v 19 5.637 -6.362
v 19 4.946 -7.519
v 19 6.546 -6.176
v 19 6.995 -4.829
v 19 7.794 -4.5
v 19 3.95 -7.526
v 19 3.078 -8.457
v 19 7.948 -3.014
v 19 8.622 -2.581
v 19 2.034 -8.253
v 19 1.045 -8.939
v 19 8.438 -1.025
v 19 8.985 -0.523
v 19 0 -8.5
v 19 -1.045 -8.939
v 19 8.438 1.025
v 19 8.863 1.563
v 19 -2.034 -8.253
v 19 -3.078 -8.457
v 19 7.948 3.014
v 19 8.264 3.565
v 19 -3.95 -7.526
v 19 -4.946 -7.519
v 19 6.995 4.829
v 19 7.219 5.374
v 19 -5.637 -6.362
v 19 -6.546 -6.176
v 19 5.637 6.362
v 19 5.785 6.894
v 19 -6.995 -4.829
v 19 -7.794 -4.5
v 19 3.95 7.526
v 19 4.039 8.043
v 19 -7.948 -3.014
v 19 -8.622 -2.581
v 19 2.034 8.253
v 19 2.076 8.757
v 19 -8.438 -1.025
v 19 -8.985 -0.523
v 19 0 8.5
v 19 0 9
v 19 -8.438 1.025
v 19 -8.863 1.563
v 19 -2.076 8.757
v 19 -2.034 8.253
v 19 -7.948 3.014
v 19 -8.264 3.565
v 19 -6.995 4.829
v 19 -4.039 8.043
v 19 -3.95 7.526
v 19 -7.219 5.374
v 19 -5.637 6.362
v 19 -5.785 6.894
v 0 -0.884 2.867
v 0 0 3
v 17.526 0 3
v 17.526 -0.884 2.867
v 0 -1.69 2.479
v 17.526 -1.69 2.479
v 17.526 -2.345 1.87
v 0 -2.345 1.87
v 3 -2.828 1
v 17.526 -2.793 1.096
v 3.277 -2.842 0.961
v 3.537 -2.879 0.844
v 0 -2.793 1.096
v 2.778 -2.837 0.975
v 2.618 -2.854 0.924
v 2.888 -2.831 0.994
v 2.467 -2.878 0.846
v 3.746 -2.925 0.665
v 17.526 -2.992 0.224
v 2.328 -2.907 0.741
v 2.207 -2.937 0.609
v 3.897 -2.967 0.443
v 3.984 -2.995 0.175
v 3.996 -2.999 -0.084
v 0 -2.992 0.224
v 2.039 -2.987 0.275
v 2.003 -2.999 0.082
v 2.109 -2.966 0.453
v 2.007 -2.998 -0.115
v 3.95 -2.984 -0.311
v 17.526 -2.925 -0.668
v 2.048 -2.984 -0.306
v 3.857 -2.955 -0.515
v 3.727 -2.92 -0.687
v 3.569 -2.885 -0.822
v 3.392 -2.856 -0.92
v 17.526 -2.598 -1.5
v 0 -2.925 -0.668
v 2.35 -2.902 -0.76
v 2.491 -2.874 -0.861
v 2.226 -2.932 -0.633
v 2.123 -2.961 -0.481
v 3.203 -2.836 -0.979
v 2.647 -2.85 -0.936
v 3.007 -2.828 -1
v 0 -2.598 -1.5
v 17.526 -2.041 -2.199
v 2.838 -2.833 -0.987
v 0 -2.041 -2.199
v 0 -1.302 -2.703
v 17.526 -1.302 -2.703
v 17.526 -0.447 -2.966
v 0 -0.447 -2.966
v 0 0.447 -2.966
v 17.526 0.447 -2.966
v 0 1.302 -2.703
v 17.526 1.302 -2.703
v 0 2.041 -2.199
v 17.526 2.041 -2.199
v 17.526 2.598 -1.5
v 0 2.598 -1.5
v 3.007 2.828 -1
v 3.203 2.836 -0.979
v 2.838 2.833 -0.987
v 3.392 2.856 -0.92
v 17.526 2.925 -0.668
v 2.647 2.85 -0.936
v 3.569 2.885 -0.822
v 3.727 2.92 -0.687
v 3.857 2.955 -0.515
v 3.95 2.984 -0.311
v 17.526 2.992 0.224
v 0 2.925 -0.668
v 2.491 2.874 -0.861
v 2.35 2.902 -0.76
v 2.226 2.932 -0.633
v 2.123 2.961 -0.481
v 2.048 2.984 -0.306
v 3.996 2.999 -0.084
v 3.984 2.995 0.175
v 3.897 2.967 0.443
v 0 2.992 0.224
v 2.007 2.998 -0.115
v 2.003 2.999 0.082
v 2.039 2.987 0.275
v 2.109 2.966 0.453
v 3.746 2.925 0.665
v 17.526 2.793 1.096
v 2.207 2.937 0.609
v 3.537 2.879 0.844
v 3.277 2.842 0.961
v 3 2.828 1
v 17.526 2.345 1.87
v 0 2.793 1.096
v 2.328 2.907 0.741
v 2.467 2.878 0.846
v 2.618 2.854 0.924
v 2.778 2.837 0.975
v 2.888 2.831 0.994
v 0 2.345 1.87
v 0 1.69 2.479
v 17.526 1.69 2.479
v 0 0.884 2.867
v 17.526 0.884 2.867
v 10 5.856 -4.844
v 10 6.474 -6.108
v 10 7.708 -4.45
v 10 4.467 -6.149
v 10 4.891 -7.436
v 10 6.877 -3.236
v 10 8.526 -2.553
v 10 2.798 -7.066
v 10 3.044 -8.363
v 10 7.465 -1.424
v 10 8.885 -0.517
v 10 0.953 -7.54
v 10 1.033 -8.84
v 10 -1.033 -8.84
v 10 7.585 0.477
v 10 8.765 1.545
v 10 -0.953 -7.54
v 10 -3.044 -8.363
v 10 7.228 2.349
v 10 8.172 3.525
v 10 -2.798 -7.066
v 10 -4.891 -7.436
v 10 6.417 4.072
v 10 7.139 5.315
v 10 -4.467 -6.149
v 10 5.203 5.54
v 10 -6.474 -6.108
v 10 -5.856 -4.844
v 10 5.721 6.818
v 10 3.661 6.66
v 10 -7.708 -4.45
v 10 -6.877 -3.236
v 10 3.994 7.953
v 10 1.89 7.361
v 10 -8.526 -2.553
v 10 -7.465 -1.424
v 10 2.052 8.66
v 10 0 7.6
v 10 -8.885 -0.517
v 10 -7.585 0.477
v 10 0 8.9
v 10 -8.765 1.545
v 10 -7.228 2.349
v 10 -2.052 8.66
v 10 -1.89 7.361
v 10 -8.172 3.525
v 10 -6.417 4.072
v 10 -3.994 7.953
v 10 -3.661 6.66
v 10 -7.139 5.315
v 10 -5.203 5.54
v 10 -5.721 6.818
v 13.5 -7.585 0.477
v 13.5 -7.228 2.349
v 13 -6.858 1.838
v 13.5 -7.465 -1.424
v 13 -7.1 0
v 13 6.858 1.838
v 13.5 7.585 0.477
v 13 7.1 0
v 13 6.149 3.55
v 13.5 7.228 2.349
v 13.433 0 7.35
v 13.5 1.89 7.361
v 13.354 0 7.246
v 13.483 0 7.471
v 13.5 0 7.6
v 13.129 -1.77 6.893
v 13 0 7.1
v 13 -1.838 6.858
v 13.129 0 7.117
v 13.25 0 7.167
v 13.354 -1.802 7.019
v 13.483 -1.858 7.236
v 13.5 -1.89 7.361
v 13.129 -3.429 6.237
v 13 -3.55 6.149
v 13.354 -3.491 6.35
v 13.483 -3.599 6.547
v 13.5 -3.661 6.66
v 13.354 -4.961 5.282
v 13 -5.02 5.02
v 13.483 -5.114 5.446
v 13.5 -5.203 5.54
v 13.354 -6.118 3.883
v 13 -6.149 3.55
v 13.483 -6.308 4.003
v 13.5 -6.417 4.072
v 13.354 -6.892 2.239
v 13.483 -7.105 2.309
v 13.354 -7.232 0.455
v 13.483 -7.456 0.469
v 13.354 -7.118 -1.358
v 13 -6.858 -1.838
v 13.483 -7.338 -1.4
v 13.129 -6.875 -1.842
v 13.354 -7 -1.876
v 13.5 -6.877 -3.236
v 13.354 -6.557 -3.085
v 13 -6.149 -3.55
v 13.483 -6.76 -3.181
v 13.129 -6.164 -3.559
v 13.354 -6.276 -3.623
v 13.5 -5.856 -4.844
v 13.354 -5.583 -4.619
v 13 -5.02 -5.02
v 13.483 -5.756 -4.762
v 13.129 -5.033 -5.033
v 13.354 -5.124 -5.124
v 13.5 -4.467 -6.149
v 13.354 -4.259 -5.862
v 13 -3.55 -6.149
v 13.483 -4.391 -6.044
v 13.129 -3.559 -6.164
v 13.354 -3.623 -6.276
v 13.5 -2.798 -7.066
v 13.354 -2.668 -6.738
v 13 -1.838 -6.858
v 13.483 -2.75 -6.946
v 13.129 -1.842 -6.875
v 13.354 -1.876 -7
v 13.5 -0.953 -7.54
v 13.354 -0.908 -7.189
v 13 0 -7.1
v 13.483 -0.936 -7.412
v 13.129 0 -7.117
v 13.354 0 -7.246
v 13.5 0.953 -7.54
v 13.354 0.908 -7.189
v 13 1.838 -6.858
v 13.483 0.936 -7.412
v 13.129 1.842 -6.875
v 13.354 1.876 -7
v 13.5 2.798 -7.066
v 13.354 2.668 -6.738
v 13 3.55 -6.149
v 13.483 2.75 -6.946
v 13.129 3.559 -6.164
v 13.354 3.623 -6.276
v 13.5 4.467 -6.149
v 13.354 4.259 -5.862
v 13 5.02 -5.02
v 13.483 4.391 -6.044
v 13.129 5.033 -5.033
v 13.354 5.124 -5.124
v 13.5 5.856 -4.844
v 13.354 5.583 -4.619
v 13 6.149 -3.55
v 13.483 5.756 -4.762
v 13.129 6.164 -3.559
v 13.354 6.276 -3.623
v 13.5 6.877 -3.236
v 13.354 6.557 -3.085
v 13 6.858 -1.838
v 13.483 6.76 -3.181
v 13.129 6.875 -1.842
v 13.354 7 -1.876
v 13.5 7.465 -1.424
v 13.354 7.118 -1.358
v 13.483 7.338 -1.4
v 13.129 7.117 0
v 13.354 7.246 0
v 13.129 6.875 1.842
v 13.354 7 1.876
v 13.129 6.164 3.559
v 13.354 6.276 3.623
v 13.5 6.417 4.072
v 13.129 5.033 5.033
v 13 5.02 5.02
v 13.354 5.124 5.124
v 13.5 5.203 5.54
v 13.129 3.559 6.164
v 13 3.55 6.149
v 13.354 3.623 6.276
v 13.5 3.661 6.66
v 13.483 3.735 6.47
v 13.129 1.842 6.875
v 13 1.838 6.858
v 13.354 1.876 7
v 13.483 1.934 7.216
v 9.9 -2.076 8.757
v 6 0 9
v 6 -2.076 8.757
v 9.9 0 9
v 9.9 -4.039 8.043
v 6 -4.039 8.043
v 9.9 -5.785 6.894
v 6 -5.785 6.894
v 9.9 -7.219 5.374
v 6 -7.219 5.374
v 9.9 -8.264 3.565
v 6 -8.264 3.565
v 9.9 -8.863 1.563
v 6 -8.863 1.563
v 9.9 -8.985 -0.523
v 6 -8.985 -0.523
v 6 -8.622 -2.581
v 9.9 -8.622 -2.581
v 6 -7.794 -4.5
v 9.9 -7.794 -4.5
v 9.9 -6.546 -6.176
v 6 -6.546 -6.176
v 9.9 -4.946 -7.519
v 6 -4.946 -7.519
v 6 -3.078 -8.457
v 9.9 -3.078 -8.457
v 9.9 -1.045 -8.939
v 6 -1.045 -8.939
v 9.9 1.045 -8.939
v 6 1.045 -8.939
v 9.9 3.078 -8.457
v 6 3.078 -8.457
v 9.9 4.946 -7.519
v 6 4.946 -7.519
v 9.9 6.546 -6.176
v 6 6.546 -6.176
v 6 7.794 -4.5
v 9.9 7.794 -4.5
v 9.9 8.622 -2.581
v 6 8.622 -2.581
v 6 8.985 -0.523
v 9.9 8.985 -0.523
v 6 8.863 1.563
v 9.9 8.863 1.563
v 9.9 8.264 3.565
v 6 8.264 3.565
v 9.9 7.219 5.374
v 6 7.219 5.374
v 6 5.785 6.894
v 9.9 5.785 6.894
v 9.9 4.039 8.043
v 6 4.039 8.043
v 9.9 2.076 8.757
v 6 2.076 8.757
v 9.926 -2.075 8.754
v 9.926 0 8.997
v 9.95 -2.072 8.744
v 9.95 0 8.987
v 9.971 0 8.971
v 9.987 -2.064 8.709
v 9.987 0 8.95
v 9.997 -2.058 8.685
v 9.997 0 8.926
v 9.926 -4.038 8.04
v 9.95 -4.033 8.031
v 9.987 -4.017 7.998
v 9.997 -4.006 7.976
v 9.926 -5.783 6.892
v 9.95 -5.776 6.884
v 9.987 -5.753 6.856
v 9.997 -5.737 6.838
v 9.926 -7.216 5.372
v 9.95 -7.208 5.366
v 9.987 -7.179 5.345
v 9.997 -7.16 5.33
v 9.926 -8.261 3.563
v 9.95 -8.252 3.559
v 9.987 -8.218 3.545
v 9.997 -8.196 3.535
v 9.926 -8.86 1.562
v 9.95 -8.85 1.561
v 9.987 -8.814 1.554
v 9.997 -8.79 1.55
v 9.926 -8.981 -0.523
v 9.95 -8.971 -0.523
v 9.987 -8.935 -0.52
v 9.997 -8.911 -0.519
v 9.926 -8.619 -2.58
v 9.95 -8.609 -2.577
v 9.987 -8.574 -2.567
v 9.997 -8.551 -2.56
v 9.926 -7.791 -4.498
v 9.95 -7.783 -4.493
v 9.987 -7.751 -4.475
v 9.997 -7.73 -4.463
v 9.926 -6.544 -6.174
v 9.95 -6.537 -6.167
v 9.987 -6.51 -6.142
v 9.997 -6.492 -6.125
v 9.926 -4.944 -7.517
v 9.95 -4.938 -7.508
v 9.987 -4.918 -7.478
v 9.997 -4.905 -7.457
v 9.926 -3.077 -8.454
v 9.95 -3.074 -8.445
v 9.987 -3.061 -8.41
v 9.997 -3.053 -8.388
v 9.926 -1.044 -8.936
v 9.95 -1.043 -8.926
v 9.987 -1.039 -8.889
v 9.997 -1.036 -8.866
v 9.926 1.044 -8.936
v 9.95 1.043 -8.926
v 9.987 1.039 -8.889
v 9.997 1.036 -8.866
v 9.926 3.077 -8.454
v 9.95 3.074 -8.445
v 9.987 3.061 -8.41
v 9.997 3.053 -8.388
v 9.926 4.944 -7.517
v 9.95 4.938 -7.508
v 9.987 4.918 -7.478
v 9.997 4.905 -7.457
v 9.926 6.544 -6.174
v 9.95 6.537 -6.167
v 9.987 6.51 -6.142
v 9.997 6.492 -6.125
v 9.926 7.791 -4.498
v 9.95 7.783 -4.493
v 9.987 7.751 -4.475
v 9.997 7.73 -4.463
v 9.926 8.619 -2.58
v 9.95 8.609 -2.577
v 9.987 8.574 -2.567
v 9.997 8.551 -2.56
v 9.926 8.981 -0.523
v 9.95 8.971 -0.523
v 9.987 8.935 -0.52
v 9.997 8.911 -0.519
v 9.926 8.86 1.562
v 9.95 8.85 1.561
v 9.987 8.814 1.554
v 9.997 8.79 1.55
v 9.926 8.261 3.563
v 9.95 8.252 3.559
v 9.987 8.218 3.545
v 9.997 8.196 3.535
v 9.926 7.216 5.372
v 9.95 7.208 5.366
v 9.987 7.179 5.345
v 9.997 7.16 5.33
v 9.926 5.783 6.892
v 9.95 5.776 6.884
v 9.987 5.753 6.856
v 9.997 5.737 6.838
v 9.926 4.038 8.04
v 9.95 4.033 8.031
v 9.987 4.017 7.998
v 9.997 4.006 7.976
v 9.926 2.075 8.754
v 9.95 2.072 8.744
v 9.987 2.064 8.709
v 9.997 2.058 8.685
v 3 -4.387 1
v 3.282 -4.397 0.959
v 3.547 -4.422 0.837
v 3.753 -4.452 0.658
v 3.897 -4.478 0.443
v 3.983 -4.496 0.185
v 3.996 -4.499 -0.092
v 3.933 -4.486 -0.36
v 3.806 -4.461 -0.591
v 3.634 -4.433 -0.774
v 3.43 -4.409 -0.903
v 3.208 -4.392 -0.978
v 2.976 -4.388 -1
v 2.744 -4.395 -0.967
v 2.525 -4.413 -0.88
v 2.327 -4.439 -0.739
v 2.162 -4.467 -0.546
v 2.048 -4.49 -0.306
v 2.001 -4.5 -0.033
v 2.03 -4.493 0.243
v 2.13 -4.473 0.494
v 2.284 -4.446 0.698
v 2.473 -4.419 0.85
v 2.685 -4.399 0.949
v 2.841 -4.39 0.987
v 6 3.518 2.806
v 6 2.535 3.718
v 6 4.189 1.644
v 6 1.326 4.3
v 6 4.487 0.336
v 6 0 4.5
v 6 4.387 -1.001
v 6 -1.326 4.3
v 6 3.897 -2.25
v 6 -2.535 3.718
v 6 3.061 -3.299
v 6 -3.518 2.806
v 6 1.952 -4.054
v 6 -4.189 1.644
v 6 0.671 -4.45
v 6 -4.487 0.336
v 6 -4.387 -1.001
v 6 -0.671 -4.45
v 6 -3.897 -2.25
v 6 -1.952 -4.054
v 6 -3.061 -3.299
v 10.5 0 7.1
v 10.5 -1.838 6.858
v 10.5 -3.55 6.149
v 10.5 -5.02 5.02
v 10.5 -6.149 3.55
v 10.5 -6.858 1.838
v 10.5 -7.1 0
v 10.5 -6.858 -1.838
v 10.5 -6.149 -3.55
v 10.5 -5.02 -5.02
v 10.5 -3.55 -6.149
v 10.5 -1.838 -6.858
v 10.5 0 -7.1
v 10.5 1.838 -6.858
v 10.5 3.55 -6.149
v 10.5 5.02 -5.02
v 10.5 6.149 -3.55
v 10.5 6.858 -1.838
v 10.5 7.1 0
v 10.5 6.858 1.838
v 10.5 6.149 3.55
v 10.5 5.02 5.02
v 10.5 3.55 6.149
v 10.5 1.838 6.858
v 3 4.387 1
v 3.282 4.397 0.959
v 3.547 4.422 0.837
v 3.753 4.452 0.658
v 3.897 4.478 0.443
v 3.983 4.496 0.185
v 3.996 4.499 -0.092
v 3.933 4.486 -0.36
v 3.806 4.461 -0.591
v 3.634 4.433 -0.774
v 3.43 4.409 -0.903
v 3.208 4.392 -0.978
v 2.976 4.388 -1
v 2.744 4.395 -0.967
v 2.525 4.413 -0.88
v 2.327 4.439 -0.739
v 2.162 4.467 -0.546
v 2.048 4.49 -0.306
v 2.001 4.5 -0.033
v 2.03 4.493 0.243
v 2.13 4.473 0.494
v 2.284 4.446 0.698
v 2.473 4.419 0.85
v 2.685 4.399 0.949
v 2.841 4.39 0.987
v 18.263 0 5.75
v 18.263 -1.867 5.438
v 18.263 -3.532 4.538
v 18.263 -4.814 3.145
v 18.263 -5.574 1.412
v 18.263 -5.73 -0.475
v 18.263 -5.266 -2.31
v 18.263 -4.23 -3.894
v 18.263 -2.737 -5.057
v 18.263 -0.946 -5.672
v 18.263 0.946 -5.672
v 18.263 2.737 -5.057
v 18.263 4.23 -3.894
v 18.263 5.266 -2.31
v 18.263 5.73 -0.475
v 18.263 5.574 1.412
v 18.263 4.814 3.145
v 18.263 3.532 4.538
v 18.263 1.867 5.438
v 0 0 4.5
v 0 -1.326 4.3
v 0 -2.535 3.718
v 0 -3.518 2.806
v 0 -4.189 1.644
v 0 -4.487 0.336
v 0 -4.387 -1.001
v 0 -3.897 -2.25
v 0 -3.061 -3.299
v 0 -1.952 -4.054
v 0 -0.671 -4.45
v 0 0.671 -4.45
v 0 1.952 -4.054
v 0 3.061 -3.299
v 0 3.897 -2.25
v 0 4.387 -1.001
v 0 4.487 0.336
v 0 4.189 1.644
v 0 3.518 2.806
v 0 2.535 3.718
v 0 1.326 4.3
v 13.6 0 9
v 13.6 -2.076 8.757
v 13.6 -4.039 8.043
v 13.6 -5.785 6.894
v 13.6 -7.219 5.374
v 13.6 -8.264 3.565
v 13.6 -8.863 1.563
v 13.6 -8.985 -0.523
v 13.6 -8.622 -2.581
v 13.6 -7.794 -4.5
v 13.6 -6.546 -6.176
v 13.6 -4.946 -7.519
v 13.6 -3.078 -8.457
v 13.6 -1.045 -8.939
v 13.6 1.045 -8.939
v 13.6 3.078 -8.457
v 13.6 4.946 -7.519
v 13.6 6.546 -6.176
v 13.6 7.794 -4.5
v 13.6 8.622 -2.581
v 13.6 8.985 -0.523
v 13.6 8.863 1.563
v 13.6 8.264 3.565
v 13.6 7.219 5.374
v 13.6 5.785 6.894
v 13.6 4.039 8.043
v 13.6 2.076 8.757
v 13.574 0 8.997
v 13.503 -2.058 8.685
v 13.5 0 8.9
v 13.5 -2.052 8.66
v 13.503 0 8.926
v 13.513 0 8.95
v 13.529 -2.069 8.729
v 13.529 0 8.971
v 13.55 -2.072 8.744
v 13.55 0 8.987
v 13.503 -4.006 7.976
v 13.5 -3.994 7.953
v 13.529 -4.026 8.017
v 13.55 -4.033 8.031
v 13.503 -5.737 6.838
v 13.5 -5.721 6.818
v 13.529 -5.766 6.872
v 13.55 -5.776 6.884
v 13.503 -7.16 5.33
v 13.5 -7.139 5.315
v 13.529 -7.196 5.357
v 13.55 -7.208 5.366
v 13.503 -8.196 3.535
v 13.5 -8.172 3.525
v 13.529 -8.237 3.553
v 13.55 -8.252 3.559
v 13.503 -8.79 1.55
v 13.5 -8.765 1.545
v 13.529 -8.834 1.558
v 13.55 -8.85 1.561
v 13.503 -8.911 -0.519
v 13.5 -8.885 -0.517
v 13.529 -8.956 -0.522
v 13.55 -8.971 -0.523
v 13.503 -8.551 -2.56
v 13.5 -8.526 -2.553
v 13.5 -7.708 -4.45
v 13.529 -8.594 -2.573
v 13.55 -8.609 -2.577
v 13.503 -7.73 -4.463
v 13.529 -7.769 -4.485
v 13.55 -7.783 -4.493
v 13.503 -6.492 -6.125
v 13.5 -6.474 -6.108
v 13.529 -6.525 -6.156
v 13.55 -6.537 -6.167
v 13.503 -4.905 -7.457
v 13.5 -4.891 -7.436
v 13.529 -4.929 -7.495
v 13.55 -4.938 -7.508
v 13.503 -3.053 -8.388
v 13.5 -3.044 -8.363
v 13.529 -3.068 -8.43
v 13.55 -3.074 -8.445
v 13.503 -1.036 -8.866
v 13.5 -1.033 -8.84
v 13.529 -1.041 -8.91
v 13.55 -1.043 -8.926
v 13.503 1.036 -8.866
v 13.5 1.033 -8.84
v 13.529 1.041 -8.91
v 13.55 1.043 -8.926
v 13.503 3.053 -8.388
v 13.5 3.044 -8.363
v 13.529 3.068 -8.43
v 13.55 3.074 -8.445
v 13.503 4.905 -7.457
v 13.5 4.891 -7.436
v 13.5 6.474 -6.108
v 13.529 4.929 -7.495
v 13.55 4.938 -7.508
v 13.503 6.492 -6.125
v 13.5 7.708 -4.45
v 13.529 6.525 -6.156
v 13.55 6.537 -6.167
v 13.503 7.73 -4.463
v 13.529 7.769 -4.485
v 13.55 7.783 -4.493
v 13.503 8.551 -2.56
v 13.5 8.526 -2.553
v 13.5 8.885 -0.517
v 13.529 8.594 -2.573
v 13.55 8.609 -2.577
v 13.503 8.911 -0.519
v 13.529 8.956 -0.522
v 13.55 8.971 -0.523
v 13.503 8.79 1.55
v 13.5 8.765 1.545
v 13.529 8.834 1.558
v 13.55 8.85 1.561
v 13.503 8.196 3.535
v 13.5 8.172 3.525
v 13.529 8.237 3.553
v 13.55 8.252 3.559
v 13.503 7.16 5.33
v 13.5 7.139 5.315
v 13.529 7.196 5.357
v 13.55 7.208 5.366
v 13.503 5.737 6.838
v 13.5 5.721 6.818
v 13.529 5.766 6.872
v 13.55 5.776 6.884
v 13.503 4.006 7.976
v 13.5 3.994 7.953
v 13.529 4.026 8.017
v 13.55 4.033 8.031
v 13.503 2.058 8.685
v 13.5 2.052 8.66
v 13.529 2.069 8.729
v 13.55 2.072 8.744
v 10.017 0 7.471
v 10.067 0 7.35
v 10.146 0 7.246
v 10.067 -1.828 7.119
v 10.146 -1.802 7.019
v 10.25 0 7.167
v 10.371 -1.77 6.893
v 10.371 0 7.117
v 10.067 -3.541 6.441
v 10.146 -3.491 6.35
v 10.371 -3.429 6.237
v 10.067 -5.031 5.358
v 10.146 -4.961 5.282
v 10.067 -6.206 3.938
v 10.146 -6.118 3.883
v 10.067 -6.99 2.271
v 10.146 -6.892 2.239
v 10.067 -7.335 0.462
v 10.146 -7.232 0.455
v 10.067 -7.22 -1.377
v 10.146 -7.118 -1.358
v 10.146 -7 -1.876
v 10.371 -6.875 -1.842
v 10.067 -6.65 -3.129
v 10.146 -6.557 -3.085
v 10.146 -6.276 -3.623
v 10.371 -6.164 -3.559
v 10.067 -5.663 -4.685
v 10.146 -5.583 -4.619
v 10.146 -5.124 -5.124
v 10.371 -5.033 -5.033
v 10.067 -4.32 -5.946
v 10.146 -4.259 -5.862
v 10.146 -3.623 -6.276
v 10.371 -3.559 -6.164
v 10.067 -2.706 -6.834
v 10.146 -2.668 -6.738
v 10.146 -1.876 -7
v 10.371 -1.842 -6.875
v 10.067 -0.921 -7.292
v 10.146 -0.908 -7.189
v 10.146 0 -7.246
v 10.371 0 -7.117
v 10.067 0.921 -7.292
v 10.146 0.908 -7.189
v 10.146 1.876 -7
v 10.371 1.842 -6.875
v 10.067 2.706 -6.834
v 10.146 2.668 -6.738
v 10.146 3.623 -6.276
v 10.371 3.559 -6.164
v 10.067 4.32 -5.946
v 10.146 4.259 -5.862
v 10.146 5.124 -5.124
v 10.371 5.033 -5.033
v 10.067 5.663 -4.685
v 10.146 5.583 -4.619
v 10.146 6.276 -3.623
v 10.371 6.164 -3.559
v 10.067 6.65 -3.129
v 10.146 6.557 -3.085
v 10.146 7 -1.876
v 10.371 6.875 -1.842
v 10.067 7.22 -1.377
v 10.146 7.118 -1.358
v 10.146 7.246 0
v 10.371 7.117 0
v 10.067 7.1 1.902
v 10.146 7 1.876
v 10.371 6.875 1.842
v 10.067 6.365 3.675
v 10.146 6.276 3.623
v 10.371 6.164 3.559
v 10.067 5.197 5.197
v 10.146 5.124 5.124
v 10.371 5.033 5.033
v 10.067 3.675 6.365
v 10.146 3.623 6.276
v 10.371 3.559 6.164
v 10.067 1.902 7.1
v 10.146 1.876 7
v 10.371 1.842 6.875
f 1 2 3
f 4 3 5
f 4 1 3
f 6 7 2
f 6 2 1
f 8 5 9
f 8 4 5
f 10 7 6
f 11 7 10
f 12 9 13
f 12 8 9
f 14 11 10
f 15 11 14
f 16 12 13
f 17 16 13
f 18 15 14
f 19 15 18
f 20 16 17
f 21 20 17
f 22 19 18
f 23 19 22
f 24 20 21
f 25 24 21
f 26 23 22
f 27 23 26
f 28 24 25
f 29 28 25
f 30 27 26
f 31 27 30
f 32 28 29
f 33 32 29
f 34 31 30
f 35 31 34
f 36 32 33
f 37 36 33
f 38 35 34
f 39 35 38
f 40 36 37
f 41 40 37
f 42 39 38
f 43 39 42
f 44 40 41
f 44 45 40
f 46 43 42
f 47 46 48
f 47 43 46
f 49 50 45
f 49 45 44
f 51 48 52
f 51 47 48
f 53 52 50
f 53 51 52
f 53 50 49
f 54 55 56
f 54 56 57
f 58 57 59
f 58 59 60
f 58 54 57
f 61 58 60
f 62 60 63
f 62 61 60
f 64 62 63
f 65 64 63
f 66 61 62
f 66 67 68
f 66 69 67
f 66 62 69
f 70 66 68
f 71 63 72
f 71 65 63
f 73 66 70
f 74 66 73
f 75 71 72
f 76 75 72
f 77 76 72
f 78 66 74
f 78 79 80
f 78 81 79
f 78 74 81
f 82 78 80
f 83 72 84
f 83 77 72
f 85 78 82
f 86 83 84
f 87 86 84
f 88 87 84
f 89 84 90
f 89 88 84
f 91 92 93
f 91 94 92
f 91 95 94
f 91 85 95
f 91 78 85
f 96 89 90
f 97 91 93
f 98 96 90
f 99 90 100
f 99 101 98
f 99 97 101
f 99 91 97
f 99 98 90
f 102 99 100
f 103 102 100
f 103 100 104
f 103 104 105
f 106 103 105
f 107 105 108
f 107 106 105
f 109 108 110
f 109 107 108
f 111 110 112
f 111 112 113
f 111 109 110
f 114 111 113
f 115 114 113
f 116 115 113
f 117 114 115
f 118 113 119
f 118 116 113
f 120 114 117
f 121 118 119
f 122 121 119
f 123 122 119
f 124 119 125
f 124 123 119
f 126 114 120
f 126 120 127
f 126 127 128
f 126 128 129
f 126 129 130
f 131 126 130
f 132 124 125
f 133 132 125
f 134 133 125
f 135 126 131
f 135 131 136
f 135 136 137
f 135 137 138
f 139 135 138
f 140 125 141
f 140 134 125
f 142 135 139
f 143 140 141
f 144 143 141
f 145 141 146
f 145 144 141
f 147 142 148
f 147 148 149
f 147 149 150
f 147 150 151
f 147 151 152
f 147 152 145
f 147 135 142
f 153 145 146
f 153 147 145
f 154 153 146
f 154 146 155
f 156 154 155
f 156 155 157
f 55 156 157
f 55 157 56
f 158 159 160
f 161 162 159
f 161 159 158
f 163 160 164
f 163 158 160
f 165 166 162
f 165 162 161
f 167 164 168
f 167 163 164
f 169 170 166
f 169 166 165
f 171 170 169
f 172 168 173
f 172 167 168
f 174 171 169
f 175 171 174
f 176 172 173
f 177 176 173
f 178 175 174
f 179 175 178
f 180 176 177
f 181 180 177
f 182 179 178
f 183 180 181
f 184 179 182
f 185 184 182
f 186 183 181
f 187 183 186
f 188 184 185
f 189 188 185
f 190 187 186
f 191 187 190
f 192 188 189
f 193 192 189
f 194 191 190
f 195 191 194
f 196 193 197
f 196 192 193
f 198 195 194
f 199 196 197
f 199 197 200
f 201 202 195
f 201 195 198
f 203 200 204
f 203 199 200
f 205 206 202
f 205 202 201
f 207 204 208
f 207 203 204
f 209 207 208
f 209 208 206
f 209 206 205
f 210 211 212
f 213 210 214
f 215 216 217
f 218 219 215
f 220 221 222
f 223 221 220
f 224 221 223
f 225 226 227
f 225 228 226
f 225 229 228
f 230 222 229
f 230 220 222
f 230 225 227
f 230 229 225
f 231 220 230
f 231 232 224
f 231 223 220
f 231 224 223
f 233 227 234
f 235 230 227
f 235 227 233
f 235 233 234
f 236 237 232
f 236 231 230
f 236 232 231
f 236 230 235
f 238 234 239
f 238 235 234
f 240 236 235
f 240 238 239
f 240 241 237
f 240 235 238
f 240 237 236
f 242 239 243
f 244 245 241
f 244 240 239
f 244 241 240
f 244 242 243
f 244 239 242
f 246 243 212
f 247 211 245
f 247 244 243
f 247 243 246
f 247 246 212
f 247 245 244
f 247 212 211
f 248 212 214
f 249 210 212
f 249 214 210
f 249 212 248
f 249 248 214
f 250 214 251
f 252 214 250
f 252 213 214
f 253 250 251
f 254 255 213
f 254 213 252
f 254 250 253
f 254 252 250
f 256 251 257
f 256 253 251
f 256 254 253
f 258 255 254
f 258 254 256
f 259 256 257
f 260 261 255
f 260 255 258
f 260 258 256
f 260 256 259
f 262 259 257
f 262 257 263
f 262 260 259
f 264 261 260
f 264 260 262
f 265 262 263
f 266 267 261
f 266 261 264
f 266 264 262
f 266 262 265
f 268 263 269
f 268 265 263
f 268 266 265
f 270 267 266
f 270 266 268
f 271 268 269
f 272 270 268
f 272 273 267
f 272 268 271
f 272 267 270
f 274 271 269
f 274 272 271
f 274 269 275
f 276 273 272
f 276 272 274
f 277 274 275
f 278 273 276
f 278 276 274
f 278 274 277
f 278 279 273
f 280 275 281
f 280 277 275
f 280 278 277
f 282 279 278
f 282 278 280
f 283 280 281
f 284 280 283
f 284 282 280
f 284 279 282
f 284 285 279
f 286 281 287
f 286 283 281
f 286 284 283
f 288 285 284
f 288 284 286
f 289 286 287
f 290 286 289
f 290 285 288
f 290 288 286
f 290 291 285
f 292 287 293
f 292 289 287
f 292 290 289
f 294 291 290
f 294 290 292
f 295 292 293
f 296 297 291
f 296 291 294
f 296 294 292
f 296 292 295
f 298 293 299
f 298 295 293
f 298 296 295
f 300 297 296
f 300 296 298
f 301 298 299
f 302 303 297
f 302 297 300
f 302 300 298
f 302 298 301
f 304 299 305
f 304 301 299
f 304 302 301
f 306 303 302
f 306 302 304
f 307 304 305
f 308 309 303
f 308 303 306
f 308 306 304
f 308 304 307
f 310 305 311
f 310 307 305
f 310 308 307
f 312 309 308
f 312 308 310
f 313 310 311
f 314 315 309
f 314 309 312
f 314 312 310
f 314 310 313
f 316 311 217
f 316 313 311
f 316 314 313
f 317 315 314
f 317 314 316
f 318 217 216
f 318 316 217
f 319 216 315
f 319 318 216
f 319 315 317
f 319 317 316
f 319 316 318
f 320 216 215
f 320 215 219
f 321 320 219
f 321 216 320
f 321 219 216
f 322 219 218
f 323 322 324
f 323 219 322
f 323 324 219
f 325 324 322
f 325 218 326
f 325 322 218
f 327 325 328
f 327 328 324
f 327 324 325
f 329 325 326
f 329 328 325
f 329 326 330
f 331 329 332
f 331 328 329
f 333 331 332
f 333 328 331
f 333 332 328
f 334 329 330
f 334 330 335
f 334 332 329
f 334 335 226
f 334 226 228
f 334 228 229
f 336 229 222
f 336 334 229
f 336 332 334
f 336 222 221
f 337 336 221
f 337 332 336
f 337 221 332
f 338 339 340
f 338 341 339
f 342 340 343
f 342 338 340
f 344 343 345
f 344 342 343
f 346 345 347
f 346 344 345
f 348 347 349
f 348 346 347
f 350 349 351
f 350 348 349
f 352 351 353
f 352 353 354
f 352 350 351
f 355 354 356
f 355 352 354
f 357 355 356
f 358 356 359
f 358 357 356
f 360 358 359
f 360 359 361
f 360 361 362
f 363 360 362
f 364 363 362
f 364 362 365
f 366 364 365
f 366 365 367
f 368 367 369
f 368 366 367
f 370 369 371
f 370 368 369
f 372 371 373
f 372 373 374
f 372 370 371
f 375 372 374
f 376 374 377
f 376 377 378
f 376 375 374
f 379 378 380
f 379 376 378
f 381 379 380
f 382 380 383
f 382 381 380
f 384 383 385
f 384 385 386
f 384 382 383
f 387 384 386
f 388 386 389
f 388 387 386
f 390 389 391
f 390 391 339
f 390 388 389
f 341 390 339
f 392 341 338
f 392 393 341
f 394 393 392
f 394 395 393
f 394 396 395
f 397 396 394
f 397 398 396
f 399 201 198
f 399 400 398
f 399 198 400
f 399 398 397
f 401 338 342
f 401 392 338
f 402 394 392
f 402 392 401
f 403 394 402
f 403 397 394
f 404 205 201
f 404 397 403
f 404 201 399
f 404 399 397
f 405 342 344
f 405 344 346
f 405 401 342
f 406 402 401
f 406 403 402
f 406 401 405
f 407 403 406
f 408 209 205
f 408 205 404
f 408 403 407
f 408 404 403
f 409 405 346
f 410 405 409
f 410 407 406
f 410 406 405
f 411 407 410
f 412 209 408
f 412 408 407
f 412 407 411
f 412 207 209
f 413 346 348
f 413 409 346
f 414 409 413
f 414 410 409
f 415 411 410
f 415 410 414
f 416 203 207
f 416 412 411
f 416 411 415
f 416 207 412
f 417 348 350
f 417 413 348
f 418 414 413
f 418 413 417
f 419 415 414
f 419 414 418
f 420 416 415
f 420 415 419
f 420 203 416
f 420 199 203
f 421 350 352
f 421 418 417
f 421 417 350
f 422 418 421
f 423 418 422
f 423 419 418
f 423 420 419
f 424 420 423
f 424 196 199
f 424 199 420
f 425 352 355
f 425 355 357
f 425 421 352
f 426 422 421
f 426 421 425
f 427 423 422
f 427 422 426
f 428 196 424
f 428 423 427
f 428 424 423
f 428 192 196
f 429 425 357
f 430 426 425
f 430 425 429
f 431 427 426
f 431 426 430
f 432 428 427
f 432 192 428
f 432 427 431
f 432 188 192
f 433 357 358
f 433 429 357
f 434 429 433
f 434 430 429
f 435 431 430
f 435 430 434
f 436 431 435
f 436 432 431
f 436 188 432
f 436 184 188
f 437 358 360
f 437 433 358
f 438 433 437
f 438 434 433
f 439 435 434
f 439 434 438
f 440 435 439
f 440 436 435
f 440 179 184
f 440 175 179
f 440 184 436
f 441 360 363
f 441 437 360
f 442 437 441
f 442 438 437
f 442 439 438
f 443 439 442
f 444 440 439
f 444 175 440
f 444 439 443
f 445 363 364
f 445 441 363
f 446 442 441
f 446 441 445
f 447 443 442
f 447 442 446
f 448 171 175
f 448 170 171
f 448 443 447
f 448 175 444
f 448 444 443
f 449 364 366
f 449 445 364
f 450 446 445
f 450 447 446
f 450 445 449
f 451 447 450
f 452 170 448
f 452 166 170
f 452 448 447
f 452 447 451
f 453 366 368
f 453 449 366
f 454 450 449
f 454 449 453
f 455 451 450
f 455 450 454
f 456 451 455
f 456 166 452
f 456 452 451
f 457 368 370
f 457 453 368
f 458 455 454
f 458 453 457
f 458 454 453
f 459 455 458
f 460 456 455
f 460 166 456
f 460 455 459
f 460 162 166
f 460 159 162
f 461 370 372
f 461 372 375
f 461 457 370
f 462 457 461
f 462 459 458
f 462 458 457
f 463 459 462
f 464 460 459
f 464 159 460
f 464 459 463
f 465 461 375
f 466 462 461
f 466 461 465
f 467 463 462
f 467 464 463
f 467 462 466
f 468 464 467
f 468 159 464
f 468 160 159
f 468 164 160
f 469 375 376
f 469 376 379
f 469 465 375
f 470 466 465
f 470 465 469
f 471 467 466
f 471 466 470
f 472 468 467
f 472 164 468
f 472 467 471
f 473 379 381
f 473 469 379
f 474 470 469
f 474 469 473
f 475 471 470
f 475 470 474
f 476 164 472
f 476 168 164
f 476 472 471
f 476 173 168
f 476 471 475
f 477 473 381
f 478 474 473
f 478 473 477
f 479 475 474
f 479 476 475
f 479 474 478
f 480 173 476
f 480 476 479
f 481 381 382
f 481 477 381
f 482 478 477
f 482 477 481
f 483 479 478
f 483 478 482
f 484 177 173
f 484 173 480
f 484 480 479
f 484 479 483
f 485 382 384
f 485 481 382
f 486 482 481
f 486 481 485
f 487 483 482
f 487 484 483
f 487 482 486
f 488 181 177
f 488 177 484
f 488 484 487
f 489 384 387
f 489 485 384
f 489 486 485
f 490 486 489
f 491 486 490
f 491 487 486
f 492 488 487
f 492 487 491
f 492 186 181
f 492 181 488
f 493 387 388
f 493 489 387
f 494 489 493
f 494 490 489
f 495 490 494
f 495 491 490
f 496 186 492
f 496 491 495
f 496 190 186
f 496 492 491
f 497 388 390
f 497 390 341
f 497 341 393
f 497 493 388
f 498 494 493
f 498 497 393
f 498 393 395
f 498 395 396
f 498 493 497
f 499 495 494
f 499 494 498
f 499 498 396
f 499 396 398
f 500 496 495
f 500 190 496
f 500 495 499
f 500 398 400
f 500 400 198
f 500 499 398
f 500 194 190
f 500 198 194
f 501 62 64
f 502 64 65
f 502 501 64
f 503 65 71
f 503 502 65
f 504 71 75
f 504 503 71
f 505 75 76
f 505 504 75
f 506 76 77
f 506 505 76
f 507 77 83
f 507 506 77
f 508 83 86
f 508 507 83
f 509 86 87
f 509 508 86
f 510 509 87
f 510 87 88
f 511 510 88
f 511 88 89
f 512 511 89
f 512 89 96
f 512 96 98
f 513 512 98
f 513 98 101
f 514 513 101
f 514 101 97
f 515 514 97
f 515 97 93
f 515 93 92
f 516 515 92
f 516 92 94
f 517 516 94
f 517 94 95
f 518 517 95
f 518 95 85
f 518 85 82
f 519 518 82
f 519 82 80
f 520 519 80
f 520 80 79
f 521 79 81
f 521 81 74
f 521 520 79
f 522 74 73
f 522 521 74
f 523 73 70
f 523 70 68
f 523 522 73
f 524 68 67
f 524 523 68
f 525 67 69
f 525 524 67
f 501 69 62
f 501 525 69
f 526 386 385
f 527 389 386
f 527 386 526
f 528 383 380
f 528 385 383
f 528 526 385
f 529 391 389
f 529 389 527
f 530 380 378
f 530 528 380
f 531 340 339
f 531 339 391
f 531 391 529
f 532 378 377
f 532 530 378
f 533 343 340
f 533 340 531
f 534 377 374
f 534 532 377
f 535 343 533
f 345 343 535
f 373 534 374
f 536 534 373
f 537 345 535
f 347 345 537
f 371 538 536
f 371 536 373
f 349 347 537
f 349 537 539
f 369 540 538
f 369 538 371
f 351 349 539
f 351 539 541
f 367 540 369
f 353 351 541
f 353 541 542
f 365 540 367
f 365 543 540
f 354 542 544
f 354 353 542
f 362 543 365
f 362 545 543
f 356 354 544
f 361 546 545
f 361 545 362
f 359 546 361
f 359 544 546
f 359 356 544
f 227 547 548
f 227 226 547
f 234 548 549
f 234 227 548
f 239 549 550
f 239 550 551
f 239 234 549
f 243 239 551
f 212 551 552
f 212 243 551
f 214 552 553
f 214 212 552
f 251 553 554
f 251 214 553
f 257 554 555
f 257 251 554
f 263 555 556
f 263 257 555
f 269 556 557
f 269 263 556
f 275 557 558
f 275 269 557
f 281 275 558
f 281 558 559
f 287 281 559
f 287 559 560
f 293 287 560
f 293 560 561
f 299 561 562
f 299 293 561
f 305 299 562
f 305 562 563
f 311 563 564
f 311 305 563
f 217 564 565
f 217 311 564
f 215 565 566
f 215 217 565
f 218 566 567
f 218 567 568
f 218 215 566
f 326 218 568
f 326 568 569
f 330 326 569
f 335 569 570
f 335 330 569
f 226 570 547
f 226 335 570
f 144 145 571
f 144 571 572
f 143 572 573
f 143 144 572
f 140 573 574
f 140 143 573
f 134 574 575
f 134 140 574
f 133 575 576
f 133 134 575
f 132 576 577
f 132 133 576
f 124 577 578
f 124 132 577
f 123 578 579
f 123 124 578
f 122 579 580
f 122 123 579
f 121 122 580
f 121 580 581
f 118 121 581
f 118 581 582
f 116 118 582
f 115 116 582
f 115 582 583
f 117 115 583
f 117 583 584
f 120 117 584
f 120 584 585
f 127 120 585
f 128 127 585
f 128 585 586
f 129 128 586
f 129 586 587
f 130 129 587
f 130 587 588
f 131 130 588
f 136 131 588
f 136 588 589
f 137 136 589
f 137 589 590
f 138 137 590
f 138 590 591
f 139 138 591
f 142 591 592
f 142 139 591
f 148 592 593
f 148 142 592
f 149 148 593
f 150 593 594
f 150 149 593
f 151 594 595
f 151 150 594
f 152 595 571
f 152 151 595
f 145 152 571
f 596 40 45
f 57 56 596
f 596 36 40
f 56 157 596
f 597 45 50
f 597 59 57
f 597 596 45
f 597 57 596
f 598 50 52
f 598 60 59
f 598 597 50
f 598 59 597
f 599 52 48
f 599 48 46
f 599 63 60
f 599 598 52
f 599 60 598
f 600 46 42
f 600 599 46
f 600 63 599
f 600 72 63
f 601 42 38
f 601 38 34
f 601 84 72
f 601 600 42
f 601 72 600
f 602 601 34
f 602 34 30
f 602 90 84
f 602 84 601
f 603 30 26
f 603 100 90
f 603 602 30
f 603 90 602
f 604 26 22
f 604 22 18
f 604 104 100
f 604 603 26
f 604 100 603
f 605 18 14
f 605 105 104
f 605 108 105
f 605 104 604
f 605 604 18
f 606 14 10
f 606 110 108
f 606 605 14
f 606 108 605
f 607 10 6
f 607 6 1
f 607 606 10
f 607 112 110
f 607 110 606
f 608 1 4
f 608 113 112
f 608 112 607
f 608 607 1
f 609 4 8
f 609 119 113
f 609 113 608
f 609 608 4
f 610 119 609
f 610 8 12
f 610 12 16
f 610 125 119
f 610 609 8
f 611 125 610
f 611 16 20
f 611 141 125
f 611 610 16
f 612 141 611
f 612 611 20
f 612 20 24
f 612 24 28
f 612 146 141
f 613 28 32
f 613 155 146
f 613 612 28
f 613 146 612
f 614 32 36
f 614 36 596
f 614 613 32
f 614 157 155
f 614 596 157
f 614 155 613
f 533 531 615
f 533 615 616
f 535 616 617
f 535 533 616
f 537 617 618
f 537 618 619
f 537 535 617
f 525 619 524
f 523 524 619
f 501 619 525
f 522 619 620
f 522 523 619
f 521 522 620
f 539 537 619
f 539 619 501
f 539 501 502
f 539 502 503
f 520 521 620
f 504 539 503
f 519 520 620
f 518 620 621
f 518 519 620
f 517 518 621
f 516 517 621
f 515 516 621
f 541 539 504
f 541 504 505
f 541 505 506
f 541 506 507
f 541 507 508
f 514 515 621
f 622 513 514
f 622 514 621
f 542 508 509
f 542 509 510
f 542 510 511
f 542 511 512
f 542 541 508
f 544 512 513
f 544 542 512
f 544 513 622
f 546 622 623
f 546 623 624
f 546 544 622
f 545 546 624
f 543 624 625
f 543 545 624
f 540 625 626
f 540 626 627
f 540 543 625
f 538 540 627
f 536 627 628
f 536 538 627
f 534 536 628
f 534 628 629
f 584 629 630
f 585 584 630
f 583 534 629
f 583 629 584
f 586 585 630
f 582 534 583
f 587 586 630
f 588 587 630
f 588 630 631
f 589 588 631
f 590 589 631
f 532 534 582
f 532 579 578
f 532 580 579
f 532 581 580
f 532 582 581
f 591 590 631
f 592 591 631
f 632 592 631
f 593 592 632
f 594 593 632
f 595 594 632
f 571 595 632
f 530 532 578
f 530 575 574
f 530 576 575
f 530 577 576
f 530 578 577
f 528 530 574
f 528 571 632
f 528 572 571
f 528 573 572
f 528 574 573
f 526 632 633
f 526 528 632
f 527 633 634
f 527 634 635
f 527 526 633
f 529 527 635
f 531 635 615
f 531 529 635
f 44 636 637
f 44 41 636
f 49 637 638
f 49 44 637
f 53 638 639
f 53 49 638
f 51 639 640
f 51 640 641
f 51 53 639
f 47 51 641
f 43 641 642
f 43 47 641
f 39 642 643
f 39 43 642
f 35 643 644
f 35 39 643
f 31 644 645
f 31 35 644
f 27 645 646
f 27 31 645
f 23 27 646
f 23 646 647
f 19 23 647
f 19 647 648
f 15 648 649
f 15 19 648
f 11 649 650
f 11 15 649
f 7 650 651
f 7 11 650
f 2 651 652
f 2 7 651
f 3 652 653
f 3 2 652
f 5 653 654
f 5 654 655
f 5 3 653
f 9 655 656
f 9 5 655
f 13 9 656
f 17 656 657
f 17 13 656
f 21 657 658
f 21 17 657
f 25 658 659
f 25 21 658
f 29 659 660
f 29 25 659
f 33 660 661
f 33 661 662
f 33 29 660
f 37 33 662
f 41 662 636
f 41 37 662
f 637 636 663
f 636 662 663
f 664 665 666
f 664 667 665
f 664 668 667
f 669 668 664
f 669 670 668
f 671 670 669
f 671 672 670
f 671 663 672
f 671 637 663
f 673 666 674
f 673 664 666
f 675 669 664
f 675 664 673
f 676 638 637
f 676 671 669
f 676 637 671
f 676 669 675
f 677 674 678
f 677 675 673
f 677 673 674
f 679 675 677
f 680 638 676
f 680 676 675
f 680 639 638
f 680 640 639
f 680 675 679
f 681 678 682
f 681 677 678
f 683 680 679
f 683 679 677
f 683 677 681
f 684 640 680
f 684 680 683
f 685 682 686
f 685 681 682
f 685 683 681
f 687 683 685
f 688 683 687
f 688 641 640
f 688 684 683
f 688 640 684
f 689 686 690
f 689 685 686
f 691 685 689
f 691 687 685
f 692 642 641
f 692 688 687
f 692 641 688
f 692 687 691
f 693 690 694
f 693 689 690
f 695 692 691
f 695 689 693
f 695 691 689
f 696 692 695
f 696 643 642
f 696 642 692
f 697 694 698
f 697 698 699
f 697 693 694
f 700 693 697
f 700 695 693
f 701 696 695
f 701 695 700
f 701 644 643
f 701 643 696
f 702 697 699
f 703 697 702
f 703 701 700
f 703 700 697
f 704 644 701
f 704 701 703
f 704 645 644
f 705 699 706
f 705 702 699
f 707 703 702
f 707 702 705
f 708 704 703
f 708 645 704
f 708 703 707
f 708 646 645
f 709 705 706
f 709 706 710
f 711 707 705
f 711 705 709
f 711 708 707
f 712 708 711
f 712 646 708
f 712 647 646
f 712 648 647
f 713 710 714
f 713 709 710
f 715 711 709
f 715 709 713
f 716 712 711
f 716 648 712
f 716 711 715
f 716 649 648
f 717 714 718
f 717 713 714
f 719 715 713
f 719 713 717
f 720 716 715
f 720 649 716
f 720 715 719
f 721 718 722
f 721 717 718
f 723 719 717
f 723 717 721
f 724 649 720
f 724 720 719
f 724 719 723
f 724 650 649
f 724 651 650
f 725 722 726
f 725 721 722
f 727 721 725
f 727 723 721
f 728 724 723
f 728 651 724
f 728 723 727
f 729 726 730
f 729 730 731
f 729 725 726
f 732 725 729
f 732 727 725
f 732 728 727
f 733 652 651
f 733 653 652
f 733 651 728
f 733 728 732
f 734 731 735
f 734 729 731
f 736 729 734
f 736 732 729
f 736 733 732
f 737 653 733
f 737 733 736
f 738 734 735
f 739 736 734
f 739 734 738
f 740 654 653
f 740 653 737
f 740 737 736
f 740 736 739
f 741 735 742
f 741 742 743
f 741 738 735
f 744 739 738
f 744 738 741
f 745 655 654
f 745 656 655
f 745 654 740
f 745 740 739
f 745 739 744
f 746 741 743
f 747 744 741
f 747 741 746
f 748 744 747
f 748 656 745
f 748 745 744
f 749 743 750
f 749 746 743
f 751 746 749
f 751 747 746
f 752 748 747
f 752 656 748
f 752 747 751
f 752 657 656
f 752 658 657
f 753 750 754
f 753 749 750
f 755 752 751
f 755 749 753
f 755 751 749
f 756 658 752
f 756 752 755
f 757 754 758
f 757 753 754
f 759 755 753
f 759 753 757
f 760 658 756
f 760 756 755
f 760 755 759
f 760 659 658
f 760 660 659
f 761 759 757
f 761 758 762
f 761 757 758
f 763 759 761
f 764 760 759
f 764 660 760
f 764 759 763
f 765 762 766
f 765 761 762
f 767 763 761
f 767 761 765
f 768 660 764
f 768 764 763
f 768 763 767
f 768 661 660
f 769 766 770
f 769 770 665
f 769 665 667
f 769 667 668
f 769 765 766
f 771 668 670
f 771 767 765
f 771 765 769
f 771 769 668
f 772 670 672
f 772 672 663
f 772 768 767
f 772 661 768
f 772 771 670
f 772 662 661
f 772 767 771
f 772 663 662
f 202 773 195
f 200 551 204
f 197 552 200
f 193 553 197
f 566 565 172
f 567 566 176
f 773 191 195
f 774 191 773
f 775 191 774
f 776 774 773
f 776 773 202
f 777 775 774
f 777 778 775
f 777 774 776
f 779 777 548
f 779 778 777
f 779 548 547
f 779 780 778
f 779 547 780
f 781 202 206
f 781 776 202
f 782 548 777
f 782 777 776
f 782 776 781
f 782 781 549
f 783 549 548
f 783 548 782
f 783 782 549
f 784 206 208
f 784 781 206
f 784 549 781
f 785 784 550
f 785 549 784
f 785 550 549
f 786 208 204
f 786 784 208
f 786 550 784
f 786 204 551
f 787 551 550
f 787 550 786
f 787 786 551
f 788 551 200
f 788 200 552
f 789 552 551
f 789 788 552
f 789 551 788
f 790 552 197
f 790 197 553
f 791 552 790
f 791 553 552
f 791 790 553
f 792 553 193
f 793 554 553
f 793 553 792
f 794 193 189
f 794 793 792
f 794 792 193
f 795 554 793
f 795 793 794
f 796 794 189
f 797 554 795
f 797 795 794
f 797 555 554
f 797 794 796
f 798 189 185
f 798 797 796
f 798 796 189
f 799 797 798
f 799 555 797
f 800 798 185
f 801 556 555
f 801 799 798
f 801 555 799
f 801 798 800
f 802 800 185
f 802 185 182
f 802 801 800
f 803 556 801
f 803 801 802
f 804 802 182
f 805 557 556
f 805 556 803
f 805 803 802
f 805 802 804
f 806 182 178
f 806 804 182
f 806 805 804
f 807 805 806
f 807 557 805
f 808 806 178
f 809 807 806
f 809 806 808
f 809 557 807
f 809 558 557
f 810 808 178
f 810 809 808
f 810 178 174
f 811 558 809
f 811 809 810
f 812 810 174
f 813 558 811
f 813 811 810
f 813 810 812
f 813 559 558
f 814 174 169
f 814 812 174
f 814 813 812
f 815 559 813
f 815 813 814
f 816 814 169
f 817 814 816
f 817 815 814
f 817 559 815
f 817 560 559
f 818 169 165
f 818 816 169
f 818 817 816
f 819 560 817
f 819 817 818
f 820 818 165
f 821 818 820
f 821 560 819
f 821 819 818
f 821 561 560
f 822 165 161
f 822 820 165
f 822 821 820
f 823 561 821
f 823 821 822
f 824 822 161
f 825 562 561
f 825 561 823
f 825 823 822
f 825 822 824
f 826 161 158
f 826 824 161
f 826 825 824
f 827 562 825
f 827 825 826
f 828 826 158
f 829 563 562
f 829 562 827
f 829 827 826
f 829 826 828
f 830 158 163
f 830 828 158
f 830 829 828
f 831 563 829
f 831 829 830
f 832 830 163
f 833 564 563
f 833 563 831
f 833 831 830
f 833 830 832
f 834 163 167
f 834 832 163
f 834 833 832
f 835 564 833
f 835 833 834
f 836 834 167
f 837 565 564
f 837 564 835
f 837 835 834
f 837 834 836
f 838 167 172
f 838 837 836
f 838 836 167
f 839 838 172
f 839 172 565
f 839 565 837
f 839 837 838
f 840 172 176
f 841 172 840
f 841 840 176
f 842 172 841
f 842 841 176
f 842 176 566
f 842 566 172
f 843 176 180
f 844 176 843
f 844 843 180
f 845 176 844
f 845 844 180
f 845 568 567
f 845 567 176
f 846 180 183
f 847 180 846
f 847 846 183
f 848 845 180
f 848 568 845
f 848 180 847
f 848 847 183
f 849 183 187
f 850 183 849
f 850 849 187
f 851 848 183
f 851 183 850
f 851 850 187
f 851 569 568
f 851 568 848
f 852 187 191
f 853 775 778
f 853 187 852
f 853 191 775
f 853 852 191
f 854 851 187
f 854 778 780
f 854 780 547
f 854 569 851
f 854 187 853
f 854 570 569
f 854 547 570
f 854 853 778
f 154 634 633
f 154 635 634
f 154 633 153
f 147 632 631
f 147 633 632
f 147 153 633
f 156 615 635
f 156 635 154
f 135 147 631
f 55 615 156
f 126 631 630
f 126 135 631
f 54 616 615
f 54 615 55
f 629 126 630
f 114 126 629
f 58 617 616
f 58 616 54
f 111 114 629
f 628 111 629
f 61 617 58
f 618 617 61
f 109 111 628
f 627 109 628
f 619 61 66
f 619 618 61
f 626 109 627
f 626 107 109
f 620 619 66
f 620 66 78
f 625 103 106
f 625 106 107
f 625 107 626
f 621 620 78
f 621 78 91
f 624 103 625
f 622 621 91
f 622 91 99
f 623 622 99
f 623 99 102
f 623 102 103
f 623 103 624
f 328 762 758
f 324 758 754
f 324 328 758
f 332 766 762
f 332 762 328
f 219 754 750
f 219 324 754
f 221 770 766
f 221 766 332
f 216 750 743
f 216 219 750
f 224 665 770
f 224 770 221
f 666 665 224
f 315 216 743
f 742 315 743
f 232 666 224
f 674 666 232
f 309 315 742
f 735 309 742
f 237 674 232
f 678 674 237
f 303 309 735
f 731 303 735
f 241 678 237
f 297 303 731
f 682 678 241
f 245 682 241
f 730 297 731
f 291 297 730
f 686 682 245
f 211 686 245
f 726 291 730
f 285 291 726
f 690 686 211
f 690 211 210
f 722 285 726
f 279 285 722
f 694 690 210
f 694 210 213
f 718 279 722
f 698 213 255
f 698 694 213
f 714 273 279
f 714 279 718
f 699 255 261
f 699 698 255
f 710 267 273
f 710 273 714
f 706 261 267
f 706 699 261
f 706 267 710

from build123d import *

# Parameters (mm, degrees)
CUT_EXTRUDE_1_DEPTH      = 23.869193331
CUT_EXTRUDE_1_DEPTH_BACK = 23.869193331
SKETCH_2_R               = 1


with BuildPart() as part:
    # Эскиз1 → Повернуть1 (revolve)
    with BuildSketch(Plane.XY, mode=Mode.PRIVATE) as revolve_1_sk:
        with BuildLine():
            Line((0, 3), (0, 4.5))
            Line((0, 4.5), (6, 4.5))
            Line((6, 4.5), (6, 9))
            Line((6, 9), (9.9, 9))
            ThreePointArc((9.9, 9), (9.970710678, 8.970710678), (10, 8.9))
            Line((10, 8.9), (10, 7.6))
            ThreePointArc((10, 7.6), (10.146446609, 7.246446609), (10.5, 7.1))
            Line((10.5, 7.1), (13, 7.1))
            ThreePointArc((13, 7.1), (13.353553391, 7.246446609), (13.5, 7.6))
            Line((13.5, 7.6), (13.5, 8.9))
            ThreePointArc((13.5, 8.9), (13.529289322, 8.970710678), (13.6, 9))
            Line((13.6, 9), (19, 9))
            Line((19, 9), (19, 8.5))
            Line((19, 8.5), (17.526279442, 3))
            Line((17.526279442, 3), (0, 3))
        make_face()
    revolve(revolve_1_sk.sketch.rotate(Axis((0, 0, 0), (1, 0, 0)), 90), axis=Axis((0, 0, 0), (1, 0, 0)))

    # Эскиз2 → Вырез-Вытянуть1 (cut, two sides: drawn at the far end of the back side and taken through both)
    with BuildSketch(Plane(origin=(0, 0, 0), x_dir=(1, 0, 0), z_dir=(0, 1, 0)).offset(-CUT_EXTRUDE_1_DEPTH_BACK)):
        with Locations(Location((3, 0, 0), (0, 0, 270))):
            Circle(SKETCH_2_R)
    extrude(amount=CUT_EXTRUDE_1_DEPTH + CUT_EXTRUDE_1_DEPTH_BACK, mode=Mode.SUBTRACT)


solid = part.part
